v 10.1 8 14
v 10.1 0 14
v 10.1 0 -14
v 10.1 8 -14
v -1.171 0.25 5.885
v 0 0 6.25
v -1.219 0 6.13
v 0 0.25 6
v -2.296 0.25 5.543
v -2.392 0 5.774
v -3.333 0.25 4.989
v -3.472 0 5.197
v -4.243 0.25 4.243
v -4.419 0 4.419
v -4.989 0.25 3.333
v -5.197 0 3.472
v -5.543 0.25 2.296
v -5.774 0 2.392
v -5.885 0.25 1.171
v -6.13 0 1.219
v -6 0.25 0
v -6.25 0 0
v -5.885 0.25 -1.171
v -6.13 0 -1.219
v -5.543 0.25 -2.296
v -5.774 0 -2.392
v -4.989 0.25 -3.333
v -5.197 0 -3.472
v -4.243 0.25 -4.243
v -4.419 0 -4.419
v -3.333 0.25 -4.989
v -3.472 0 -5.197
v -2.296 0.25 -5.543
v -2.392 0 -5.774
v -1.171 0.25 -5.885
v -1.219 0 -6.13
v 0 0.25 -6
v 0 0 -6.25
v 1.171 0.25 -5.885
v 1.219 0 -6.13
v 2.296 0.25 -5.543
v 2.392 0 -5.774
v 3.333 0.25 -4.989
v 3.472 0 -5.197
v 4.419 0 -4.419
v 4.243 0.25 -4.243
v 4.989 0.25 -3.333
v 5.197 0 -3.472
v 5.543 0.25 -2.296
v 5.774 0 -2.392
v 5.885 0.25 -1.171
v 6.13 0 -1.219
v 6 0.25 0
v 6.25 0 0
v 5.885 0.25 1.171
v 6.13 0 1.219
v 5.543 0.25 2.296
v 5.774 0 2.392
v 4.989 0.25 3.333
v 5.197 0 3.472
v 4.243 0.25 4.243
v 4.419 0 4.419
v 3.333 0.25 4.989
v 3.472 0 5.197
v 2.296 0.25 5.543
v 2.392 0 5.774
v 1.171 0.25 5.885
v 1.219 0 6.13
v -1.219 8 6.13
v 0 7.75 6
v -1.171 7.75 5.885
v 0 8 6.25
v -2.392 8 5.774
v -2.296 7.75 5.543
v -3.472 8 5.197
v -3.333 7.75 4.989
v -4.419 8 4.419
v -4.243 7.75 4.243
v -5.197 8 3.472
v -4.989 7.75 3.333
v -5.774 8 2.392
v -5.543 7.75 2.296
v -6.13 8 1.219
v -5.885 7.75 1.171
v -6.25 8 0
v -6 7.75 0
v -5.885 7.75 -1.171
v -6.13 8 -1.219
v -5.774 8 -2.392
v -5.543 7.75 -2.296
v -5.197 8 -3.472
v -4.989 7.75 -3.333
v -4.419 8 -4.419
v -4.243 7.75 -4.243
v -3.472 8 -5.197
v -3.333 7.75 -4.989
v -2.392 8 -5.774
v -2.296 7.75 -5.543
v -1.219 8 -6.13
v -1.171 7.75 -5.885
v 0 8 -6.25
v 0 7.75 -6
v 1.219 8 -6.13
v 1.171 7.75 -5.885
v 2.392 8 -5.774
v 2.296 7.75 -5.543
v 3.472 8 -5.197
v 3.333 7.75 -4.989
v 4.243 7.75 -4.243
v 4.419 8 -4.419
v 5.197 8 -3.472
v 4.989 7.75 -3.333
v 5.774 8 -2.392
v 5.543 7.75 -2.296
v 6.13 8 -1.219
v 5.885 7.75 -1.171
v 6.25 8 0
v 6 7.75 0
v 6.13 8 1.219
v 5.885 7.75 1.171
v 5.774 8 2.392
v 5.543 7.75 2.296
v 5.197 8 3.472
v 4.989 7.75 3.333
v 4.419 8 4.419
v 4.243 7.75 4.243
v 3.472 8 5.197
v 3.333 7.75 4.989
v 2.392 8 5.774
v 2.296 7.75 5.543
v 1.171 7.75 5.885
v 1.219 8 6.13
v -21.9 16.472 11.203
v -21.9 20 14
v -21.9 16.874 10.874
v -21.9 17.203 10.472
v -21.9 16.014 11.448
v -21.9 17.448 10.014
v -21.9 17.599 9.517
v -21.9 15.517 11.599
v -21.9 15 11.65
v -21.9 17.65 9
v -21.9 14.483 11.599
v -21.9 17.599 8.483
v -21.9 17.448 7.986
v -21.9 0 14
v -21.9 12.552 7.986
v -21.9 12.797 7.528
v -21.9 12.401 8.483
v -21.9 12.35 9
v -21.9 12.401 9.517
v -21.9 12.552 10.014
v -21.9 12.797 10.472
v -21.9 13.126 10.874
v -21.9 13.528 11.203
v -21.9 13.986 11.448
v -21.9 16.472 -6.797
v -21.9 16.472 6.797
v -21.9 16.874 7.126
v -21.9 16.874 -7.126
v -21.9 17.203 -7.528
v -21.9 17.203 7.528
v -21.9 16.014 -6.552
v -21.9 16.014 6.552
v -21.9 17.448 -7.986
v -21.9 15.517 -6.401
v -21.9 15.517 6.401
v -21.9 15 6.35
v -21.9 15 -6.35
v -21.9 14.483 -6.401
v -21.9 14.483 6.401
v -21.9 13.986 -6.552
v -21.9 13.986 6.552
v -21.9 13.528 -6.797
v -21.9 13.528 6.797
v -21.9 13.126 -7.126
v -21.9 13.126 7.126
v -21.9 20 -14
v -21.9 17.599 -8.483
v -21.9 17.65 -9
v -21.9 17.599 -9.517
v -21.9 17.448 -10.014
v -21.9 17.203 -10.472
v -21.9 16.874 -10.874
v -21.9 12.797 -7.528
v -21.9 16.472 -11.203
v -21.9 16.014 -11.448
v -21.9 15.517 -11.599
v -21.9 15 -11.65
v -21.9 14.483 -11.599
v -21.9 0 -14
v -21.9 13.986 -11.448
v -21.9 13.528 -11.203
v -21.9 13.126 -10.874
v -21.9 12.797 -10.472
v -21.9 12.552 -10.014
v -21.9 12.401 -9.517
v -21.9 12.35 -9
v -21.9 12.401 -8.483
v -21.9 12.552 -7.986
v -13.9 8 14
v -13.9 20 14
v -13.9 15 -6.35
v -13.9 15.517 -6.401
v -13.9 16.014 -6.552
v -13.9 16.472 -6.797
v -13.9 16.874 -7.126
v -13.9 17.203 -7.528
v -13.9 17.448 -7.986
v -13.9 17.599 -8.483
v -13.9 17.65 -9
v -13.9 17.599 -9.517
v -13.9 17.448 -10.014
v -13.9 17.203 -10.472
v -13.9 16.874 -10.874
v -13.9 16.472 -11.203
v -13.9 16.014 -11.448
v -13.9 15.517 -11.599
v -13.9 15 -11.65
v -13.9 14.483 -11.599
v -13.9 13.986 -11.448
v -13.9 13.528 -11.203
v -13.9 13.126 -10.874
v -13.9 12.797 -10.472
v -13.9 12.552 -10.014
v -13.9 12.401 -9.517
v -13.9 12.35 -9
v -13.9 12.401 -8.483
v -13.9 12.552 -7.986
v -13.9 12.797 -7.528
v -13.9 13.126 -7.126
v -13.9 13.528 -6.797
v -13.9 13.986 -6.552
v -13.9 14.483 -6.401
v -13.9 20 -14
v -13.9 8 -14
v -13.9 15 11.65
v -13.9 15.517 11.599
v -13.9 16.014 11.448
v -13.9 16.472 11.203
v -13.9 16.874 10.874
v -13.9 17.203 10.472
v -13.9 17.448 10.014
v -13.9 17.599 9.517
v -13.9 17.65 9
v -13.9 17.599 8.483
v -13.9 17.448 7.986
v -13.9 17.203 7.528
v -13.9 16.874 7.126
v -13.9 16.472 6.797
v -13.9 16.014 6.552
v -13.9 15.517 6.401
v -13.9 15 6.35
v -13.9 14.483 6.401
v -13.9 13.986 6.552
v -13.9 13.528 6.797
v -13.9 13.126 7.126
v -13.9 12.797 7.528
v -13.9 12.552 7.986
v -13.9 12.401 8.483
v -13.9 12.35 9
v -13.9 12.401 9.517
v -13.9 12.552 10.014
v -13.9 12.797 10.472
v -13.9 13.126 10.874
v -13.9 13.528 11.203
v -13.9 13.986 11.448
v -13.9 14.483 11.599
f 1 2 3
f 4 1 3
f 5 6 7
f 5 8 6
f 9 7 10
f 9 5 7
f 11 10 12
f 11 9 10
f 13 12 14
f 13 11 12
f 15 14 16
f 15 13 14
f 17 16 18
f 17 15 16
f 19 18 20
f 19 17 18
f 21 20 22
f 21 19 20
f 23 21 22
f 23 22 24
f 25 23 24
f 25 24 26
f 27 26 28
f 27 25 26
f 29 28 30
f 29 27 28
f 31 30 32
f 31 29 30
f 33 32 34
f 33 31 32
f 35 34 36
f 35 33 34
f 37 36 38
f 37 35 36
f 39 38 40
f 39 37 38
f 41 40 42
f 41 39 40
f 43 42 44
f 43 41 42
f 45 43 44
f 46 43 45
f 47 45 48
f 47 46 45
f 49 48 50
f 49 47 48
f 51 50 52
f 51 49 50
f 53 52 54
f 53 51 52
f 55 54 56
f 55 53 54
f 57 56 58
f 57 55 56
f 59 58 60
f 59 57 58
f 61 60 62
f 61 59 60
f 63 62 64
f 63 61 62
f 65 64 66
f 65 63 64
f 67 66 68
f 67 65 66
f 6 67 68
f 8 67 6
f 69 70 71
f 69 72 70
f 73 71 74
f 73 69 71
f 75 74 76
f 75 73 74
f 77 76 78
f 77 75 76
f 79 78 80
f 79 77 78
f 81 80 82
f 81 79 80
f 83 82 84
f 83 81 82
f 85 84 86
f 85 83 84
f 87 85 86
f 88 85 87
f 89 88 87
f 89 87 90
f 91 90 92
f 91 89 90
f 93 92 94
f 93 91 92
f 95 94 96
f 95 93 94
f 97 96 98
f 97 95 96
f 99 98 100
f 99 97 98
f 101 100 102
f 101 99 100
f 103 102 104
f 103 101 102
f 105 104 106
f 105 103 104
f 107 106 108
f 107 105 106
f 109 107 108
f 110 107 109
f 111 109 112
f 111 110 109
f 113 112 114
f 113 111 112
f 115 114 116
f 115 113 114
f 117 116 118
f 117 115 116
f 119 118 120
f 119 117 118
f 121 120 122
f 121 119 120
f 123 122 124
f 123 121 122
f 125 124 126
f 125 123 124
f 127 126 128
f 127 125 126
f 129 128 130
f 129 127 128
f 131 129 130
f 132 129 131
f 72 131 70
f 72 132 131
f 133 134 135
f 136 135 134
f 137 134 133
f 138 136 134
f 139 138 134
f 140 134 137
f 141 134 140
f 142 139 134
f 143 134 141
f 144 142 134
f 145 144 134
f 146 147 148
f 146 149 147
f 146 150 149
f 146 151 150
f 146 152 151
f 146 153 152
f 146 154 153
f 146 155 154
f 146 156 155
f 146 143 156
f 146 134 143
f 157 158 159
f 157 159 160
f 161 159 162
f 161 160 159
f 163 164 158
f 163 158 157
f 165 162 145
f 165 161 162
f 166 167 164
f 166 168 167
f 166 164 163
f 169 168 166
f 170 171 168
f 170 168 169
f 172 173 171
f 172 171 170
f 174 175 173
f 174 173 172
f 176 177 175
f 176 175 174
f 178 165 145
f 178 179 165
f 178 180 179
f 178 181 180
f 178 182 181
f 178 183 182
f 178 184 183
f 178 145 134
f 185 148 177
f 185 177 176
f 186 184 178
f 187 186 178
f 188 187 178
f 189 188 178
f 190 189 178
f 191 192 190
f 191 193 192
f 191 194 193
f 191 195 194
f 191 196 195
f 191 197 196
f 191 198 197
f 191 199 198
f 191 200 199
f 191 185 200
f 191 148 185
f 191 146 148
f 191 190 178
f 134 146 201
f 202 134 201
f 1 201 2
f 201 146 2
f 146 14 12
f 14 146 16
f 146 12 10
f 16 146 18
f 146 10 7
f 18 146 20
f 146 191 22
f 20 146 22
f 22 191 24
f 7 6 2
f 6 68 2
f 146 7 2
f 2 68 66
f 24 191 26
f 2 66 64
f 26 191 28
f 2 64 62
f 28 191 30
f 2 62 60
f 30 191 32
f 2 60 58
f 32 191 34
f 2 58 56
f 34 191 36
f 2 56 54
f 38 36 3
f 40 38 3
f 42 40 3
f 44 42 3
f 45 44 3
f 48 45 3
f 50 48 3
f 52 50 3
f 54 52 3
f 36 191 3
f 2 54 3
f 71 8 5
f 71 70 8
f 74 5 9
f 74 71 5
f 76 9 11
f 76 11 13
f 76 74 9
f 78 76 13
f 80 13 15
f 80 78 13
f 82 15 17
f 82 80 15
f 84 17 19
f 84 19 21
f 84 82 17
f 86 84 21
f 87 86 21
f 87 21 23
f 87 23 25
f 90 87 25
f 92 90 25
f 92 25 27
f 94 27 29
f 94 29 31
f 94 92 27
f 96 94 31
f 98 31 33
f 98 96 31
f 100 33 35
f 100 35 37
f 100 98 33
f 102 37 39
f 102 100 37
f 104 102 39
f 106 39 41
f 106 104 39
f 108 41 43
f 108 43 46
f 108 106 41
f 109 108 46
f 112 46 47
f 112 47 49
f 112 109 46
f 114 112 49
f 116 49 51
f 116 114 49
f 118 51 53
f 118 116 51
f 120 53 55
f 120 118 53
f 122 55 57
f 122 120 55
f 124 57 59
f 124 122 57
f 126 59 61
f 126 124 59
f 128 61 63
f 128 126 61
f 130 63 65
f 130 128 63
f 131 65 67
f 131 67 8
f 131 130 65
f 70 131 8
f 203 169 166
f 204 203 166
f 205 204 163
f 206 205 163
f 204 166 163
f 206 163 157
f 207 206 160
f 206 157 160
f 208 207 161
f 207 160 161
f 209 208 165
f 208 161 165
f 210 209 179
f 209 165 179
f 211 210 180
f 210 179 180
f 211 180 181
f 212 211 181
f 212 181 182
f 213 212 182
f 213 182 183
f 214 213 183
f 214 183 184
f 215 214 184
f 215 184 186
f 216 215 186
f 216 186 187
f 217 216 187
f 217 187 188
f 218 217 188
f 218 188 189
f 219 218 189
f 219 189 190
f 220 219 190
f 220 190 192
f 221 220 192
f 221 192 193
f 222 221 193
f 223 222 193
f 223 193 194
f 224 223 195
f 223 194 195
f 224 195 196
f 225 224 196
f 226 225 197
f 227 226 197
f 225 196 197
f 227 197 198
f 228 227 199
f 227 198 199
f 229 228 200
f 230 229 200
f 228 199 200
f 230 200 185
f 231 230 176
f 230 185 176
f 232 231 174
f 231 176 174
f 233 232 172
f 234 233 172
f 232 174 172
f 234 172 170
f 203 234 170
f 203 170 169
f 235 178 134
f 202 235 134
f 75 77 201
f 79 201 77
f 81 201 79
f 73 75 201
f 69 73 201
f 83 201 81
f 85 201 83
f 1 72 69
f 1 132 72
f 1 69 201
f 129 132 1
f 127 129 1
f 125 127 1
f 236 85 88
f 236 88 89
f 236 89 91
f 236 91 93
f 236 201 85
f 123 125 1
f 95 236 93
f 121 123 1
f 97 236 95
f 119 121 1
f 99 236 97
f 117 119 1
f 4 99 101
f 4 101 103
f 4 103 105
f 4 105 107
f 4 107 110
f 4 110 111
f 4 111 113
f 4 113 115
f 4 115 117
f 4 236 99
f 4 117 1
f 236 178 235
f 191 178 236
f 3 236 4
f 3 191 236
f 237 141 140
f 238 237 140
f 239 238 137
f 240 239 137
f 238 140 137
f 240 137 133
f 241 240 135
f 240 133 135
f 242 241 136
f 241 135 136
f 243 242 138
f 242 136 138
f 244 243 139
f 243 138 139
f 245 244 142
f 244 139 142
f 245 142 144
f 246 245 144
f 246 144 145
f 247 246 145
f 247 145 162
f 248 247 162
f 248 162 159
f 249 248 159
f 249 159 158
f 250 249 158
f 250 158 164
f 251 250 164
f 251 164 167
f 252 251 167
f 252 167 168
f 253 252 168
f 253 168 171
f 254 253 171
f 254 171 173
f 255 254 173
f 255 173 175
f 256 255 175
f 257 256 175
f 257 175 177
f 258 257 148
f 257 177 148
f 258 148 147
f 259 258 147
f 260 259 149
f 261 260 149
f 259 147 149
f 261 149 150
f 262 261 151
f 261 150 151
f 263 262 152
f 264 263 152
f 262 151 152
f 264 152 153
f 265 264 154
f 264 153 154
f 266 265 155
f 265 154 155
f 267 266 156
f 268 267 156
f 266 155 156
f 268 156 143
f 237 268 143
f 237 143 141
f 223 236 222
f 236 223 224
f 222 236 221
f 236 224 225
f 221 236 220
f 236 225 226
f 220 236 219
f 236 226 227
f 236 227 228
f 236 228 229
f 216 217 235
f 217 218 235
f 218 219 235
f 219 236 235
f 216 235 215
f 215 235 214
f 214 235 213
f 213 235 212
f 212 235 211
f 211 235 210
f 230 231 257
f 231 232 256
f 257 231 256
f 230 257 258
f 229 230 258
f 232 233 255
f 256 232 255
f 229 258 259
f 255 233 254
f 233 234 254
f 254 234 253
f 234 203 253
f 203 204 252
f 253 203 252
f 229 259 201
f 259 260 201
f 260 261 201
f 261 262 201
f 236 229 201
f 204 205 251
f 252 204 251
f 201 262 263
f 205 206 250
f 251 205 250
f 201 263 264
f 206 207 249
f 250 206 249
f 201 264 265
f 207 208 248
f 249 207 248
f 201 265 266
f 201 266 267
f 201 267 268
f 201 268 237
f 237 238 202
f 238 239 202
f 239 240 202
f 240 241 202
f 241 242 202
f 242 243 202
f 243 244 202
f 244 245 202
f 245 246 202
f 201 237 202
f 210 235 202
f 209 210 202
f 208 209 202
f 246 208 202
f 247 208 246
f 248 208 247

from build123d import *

# Parameters (mm, degrees)
SKETCH1_W            = 32
SKETCH1_H            = 28
BOSS_EXTRUDE1_DEPTH  = 8
SKETCH4_W            = 28
SKETCH4_H            = 20
BOSS_EXTRUDE2_DEPTH  = 8
M5_CLEARANCE_HOLE1_D = 5.3


with BuildPart() as part:
    # Sketch1 → Boss-Extrude1 (new body)
    with BuildSketch(Plane(origin=(0, 0, 0), x_dir=(1, 0, 0), z_dir=(0, 1, 0))):
        with Locations((-5.9, 0)):
            Rectangle(SKETCH1_W, SKETCH1_H)
    extrude(amount=BOSS_EXTRUDE1_DEPTH)

    # Sketch3 → Ø12.0 (12) Diameter Hole1 (revolve, cut)
    with BuildSketch(Plane(origin=(0, 8, 0), x_dir=(0, 0, 1), z_dir=(1, 0, 0))):
        Polygon((0, 0), (0, 8), (6.25, 8), (6, 7.75), (6, 0.25), (6.25, 0), align=None)
    revolve(axis=Axis((0, 14.35, 0), (0, -1, 0)), mode=Mode.SUBTRACT)

    # Sketch4 → Boss-Extrude2 (add)
    with BuildSketch(Plane.ZY.offset(21.9)):
        with Locations((0, 10)):
            Rectangle(SKETCH4_W, SKETCH4_H)
    extrude(amount=-BOSS_EXTRUDE2_DEPTH)

    # M5 Clearance Hole1 (through all)
    with Locations(Plane(origin=(-13.9, 0, 0), x_dir=(0, 0, -1), z_dir=(1, 0, 0))):
        with Locations((-9, 15), (9, 15)):
            Hole(M5_CLEARANCE_HOLE1_D / 2)


solid = part.part
